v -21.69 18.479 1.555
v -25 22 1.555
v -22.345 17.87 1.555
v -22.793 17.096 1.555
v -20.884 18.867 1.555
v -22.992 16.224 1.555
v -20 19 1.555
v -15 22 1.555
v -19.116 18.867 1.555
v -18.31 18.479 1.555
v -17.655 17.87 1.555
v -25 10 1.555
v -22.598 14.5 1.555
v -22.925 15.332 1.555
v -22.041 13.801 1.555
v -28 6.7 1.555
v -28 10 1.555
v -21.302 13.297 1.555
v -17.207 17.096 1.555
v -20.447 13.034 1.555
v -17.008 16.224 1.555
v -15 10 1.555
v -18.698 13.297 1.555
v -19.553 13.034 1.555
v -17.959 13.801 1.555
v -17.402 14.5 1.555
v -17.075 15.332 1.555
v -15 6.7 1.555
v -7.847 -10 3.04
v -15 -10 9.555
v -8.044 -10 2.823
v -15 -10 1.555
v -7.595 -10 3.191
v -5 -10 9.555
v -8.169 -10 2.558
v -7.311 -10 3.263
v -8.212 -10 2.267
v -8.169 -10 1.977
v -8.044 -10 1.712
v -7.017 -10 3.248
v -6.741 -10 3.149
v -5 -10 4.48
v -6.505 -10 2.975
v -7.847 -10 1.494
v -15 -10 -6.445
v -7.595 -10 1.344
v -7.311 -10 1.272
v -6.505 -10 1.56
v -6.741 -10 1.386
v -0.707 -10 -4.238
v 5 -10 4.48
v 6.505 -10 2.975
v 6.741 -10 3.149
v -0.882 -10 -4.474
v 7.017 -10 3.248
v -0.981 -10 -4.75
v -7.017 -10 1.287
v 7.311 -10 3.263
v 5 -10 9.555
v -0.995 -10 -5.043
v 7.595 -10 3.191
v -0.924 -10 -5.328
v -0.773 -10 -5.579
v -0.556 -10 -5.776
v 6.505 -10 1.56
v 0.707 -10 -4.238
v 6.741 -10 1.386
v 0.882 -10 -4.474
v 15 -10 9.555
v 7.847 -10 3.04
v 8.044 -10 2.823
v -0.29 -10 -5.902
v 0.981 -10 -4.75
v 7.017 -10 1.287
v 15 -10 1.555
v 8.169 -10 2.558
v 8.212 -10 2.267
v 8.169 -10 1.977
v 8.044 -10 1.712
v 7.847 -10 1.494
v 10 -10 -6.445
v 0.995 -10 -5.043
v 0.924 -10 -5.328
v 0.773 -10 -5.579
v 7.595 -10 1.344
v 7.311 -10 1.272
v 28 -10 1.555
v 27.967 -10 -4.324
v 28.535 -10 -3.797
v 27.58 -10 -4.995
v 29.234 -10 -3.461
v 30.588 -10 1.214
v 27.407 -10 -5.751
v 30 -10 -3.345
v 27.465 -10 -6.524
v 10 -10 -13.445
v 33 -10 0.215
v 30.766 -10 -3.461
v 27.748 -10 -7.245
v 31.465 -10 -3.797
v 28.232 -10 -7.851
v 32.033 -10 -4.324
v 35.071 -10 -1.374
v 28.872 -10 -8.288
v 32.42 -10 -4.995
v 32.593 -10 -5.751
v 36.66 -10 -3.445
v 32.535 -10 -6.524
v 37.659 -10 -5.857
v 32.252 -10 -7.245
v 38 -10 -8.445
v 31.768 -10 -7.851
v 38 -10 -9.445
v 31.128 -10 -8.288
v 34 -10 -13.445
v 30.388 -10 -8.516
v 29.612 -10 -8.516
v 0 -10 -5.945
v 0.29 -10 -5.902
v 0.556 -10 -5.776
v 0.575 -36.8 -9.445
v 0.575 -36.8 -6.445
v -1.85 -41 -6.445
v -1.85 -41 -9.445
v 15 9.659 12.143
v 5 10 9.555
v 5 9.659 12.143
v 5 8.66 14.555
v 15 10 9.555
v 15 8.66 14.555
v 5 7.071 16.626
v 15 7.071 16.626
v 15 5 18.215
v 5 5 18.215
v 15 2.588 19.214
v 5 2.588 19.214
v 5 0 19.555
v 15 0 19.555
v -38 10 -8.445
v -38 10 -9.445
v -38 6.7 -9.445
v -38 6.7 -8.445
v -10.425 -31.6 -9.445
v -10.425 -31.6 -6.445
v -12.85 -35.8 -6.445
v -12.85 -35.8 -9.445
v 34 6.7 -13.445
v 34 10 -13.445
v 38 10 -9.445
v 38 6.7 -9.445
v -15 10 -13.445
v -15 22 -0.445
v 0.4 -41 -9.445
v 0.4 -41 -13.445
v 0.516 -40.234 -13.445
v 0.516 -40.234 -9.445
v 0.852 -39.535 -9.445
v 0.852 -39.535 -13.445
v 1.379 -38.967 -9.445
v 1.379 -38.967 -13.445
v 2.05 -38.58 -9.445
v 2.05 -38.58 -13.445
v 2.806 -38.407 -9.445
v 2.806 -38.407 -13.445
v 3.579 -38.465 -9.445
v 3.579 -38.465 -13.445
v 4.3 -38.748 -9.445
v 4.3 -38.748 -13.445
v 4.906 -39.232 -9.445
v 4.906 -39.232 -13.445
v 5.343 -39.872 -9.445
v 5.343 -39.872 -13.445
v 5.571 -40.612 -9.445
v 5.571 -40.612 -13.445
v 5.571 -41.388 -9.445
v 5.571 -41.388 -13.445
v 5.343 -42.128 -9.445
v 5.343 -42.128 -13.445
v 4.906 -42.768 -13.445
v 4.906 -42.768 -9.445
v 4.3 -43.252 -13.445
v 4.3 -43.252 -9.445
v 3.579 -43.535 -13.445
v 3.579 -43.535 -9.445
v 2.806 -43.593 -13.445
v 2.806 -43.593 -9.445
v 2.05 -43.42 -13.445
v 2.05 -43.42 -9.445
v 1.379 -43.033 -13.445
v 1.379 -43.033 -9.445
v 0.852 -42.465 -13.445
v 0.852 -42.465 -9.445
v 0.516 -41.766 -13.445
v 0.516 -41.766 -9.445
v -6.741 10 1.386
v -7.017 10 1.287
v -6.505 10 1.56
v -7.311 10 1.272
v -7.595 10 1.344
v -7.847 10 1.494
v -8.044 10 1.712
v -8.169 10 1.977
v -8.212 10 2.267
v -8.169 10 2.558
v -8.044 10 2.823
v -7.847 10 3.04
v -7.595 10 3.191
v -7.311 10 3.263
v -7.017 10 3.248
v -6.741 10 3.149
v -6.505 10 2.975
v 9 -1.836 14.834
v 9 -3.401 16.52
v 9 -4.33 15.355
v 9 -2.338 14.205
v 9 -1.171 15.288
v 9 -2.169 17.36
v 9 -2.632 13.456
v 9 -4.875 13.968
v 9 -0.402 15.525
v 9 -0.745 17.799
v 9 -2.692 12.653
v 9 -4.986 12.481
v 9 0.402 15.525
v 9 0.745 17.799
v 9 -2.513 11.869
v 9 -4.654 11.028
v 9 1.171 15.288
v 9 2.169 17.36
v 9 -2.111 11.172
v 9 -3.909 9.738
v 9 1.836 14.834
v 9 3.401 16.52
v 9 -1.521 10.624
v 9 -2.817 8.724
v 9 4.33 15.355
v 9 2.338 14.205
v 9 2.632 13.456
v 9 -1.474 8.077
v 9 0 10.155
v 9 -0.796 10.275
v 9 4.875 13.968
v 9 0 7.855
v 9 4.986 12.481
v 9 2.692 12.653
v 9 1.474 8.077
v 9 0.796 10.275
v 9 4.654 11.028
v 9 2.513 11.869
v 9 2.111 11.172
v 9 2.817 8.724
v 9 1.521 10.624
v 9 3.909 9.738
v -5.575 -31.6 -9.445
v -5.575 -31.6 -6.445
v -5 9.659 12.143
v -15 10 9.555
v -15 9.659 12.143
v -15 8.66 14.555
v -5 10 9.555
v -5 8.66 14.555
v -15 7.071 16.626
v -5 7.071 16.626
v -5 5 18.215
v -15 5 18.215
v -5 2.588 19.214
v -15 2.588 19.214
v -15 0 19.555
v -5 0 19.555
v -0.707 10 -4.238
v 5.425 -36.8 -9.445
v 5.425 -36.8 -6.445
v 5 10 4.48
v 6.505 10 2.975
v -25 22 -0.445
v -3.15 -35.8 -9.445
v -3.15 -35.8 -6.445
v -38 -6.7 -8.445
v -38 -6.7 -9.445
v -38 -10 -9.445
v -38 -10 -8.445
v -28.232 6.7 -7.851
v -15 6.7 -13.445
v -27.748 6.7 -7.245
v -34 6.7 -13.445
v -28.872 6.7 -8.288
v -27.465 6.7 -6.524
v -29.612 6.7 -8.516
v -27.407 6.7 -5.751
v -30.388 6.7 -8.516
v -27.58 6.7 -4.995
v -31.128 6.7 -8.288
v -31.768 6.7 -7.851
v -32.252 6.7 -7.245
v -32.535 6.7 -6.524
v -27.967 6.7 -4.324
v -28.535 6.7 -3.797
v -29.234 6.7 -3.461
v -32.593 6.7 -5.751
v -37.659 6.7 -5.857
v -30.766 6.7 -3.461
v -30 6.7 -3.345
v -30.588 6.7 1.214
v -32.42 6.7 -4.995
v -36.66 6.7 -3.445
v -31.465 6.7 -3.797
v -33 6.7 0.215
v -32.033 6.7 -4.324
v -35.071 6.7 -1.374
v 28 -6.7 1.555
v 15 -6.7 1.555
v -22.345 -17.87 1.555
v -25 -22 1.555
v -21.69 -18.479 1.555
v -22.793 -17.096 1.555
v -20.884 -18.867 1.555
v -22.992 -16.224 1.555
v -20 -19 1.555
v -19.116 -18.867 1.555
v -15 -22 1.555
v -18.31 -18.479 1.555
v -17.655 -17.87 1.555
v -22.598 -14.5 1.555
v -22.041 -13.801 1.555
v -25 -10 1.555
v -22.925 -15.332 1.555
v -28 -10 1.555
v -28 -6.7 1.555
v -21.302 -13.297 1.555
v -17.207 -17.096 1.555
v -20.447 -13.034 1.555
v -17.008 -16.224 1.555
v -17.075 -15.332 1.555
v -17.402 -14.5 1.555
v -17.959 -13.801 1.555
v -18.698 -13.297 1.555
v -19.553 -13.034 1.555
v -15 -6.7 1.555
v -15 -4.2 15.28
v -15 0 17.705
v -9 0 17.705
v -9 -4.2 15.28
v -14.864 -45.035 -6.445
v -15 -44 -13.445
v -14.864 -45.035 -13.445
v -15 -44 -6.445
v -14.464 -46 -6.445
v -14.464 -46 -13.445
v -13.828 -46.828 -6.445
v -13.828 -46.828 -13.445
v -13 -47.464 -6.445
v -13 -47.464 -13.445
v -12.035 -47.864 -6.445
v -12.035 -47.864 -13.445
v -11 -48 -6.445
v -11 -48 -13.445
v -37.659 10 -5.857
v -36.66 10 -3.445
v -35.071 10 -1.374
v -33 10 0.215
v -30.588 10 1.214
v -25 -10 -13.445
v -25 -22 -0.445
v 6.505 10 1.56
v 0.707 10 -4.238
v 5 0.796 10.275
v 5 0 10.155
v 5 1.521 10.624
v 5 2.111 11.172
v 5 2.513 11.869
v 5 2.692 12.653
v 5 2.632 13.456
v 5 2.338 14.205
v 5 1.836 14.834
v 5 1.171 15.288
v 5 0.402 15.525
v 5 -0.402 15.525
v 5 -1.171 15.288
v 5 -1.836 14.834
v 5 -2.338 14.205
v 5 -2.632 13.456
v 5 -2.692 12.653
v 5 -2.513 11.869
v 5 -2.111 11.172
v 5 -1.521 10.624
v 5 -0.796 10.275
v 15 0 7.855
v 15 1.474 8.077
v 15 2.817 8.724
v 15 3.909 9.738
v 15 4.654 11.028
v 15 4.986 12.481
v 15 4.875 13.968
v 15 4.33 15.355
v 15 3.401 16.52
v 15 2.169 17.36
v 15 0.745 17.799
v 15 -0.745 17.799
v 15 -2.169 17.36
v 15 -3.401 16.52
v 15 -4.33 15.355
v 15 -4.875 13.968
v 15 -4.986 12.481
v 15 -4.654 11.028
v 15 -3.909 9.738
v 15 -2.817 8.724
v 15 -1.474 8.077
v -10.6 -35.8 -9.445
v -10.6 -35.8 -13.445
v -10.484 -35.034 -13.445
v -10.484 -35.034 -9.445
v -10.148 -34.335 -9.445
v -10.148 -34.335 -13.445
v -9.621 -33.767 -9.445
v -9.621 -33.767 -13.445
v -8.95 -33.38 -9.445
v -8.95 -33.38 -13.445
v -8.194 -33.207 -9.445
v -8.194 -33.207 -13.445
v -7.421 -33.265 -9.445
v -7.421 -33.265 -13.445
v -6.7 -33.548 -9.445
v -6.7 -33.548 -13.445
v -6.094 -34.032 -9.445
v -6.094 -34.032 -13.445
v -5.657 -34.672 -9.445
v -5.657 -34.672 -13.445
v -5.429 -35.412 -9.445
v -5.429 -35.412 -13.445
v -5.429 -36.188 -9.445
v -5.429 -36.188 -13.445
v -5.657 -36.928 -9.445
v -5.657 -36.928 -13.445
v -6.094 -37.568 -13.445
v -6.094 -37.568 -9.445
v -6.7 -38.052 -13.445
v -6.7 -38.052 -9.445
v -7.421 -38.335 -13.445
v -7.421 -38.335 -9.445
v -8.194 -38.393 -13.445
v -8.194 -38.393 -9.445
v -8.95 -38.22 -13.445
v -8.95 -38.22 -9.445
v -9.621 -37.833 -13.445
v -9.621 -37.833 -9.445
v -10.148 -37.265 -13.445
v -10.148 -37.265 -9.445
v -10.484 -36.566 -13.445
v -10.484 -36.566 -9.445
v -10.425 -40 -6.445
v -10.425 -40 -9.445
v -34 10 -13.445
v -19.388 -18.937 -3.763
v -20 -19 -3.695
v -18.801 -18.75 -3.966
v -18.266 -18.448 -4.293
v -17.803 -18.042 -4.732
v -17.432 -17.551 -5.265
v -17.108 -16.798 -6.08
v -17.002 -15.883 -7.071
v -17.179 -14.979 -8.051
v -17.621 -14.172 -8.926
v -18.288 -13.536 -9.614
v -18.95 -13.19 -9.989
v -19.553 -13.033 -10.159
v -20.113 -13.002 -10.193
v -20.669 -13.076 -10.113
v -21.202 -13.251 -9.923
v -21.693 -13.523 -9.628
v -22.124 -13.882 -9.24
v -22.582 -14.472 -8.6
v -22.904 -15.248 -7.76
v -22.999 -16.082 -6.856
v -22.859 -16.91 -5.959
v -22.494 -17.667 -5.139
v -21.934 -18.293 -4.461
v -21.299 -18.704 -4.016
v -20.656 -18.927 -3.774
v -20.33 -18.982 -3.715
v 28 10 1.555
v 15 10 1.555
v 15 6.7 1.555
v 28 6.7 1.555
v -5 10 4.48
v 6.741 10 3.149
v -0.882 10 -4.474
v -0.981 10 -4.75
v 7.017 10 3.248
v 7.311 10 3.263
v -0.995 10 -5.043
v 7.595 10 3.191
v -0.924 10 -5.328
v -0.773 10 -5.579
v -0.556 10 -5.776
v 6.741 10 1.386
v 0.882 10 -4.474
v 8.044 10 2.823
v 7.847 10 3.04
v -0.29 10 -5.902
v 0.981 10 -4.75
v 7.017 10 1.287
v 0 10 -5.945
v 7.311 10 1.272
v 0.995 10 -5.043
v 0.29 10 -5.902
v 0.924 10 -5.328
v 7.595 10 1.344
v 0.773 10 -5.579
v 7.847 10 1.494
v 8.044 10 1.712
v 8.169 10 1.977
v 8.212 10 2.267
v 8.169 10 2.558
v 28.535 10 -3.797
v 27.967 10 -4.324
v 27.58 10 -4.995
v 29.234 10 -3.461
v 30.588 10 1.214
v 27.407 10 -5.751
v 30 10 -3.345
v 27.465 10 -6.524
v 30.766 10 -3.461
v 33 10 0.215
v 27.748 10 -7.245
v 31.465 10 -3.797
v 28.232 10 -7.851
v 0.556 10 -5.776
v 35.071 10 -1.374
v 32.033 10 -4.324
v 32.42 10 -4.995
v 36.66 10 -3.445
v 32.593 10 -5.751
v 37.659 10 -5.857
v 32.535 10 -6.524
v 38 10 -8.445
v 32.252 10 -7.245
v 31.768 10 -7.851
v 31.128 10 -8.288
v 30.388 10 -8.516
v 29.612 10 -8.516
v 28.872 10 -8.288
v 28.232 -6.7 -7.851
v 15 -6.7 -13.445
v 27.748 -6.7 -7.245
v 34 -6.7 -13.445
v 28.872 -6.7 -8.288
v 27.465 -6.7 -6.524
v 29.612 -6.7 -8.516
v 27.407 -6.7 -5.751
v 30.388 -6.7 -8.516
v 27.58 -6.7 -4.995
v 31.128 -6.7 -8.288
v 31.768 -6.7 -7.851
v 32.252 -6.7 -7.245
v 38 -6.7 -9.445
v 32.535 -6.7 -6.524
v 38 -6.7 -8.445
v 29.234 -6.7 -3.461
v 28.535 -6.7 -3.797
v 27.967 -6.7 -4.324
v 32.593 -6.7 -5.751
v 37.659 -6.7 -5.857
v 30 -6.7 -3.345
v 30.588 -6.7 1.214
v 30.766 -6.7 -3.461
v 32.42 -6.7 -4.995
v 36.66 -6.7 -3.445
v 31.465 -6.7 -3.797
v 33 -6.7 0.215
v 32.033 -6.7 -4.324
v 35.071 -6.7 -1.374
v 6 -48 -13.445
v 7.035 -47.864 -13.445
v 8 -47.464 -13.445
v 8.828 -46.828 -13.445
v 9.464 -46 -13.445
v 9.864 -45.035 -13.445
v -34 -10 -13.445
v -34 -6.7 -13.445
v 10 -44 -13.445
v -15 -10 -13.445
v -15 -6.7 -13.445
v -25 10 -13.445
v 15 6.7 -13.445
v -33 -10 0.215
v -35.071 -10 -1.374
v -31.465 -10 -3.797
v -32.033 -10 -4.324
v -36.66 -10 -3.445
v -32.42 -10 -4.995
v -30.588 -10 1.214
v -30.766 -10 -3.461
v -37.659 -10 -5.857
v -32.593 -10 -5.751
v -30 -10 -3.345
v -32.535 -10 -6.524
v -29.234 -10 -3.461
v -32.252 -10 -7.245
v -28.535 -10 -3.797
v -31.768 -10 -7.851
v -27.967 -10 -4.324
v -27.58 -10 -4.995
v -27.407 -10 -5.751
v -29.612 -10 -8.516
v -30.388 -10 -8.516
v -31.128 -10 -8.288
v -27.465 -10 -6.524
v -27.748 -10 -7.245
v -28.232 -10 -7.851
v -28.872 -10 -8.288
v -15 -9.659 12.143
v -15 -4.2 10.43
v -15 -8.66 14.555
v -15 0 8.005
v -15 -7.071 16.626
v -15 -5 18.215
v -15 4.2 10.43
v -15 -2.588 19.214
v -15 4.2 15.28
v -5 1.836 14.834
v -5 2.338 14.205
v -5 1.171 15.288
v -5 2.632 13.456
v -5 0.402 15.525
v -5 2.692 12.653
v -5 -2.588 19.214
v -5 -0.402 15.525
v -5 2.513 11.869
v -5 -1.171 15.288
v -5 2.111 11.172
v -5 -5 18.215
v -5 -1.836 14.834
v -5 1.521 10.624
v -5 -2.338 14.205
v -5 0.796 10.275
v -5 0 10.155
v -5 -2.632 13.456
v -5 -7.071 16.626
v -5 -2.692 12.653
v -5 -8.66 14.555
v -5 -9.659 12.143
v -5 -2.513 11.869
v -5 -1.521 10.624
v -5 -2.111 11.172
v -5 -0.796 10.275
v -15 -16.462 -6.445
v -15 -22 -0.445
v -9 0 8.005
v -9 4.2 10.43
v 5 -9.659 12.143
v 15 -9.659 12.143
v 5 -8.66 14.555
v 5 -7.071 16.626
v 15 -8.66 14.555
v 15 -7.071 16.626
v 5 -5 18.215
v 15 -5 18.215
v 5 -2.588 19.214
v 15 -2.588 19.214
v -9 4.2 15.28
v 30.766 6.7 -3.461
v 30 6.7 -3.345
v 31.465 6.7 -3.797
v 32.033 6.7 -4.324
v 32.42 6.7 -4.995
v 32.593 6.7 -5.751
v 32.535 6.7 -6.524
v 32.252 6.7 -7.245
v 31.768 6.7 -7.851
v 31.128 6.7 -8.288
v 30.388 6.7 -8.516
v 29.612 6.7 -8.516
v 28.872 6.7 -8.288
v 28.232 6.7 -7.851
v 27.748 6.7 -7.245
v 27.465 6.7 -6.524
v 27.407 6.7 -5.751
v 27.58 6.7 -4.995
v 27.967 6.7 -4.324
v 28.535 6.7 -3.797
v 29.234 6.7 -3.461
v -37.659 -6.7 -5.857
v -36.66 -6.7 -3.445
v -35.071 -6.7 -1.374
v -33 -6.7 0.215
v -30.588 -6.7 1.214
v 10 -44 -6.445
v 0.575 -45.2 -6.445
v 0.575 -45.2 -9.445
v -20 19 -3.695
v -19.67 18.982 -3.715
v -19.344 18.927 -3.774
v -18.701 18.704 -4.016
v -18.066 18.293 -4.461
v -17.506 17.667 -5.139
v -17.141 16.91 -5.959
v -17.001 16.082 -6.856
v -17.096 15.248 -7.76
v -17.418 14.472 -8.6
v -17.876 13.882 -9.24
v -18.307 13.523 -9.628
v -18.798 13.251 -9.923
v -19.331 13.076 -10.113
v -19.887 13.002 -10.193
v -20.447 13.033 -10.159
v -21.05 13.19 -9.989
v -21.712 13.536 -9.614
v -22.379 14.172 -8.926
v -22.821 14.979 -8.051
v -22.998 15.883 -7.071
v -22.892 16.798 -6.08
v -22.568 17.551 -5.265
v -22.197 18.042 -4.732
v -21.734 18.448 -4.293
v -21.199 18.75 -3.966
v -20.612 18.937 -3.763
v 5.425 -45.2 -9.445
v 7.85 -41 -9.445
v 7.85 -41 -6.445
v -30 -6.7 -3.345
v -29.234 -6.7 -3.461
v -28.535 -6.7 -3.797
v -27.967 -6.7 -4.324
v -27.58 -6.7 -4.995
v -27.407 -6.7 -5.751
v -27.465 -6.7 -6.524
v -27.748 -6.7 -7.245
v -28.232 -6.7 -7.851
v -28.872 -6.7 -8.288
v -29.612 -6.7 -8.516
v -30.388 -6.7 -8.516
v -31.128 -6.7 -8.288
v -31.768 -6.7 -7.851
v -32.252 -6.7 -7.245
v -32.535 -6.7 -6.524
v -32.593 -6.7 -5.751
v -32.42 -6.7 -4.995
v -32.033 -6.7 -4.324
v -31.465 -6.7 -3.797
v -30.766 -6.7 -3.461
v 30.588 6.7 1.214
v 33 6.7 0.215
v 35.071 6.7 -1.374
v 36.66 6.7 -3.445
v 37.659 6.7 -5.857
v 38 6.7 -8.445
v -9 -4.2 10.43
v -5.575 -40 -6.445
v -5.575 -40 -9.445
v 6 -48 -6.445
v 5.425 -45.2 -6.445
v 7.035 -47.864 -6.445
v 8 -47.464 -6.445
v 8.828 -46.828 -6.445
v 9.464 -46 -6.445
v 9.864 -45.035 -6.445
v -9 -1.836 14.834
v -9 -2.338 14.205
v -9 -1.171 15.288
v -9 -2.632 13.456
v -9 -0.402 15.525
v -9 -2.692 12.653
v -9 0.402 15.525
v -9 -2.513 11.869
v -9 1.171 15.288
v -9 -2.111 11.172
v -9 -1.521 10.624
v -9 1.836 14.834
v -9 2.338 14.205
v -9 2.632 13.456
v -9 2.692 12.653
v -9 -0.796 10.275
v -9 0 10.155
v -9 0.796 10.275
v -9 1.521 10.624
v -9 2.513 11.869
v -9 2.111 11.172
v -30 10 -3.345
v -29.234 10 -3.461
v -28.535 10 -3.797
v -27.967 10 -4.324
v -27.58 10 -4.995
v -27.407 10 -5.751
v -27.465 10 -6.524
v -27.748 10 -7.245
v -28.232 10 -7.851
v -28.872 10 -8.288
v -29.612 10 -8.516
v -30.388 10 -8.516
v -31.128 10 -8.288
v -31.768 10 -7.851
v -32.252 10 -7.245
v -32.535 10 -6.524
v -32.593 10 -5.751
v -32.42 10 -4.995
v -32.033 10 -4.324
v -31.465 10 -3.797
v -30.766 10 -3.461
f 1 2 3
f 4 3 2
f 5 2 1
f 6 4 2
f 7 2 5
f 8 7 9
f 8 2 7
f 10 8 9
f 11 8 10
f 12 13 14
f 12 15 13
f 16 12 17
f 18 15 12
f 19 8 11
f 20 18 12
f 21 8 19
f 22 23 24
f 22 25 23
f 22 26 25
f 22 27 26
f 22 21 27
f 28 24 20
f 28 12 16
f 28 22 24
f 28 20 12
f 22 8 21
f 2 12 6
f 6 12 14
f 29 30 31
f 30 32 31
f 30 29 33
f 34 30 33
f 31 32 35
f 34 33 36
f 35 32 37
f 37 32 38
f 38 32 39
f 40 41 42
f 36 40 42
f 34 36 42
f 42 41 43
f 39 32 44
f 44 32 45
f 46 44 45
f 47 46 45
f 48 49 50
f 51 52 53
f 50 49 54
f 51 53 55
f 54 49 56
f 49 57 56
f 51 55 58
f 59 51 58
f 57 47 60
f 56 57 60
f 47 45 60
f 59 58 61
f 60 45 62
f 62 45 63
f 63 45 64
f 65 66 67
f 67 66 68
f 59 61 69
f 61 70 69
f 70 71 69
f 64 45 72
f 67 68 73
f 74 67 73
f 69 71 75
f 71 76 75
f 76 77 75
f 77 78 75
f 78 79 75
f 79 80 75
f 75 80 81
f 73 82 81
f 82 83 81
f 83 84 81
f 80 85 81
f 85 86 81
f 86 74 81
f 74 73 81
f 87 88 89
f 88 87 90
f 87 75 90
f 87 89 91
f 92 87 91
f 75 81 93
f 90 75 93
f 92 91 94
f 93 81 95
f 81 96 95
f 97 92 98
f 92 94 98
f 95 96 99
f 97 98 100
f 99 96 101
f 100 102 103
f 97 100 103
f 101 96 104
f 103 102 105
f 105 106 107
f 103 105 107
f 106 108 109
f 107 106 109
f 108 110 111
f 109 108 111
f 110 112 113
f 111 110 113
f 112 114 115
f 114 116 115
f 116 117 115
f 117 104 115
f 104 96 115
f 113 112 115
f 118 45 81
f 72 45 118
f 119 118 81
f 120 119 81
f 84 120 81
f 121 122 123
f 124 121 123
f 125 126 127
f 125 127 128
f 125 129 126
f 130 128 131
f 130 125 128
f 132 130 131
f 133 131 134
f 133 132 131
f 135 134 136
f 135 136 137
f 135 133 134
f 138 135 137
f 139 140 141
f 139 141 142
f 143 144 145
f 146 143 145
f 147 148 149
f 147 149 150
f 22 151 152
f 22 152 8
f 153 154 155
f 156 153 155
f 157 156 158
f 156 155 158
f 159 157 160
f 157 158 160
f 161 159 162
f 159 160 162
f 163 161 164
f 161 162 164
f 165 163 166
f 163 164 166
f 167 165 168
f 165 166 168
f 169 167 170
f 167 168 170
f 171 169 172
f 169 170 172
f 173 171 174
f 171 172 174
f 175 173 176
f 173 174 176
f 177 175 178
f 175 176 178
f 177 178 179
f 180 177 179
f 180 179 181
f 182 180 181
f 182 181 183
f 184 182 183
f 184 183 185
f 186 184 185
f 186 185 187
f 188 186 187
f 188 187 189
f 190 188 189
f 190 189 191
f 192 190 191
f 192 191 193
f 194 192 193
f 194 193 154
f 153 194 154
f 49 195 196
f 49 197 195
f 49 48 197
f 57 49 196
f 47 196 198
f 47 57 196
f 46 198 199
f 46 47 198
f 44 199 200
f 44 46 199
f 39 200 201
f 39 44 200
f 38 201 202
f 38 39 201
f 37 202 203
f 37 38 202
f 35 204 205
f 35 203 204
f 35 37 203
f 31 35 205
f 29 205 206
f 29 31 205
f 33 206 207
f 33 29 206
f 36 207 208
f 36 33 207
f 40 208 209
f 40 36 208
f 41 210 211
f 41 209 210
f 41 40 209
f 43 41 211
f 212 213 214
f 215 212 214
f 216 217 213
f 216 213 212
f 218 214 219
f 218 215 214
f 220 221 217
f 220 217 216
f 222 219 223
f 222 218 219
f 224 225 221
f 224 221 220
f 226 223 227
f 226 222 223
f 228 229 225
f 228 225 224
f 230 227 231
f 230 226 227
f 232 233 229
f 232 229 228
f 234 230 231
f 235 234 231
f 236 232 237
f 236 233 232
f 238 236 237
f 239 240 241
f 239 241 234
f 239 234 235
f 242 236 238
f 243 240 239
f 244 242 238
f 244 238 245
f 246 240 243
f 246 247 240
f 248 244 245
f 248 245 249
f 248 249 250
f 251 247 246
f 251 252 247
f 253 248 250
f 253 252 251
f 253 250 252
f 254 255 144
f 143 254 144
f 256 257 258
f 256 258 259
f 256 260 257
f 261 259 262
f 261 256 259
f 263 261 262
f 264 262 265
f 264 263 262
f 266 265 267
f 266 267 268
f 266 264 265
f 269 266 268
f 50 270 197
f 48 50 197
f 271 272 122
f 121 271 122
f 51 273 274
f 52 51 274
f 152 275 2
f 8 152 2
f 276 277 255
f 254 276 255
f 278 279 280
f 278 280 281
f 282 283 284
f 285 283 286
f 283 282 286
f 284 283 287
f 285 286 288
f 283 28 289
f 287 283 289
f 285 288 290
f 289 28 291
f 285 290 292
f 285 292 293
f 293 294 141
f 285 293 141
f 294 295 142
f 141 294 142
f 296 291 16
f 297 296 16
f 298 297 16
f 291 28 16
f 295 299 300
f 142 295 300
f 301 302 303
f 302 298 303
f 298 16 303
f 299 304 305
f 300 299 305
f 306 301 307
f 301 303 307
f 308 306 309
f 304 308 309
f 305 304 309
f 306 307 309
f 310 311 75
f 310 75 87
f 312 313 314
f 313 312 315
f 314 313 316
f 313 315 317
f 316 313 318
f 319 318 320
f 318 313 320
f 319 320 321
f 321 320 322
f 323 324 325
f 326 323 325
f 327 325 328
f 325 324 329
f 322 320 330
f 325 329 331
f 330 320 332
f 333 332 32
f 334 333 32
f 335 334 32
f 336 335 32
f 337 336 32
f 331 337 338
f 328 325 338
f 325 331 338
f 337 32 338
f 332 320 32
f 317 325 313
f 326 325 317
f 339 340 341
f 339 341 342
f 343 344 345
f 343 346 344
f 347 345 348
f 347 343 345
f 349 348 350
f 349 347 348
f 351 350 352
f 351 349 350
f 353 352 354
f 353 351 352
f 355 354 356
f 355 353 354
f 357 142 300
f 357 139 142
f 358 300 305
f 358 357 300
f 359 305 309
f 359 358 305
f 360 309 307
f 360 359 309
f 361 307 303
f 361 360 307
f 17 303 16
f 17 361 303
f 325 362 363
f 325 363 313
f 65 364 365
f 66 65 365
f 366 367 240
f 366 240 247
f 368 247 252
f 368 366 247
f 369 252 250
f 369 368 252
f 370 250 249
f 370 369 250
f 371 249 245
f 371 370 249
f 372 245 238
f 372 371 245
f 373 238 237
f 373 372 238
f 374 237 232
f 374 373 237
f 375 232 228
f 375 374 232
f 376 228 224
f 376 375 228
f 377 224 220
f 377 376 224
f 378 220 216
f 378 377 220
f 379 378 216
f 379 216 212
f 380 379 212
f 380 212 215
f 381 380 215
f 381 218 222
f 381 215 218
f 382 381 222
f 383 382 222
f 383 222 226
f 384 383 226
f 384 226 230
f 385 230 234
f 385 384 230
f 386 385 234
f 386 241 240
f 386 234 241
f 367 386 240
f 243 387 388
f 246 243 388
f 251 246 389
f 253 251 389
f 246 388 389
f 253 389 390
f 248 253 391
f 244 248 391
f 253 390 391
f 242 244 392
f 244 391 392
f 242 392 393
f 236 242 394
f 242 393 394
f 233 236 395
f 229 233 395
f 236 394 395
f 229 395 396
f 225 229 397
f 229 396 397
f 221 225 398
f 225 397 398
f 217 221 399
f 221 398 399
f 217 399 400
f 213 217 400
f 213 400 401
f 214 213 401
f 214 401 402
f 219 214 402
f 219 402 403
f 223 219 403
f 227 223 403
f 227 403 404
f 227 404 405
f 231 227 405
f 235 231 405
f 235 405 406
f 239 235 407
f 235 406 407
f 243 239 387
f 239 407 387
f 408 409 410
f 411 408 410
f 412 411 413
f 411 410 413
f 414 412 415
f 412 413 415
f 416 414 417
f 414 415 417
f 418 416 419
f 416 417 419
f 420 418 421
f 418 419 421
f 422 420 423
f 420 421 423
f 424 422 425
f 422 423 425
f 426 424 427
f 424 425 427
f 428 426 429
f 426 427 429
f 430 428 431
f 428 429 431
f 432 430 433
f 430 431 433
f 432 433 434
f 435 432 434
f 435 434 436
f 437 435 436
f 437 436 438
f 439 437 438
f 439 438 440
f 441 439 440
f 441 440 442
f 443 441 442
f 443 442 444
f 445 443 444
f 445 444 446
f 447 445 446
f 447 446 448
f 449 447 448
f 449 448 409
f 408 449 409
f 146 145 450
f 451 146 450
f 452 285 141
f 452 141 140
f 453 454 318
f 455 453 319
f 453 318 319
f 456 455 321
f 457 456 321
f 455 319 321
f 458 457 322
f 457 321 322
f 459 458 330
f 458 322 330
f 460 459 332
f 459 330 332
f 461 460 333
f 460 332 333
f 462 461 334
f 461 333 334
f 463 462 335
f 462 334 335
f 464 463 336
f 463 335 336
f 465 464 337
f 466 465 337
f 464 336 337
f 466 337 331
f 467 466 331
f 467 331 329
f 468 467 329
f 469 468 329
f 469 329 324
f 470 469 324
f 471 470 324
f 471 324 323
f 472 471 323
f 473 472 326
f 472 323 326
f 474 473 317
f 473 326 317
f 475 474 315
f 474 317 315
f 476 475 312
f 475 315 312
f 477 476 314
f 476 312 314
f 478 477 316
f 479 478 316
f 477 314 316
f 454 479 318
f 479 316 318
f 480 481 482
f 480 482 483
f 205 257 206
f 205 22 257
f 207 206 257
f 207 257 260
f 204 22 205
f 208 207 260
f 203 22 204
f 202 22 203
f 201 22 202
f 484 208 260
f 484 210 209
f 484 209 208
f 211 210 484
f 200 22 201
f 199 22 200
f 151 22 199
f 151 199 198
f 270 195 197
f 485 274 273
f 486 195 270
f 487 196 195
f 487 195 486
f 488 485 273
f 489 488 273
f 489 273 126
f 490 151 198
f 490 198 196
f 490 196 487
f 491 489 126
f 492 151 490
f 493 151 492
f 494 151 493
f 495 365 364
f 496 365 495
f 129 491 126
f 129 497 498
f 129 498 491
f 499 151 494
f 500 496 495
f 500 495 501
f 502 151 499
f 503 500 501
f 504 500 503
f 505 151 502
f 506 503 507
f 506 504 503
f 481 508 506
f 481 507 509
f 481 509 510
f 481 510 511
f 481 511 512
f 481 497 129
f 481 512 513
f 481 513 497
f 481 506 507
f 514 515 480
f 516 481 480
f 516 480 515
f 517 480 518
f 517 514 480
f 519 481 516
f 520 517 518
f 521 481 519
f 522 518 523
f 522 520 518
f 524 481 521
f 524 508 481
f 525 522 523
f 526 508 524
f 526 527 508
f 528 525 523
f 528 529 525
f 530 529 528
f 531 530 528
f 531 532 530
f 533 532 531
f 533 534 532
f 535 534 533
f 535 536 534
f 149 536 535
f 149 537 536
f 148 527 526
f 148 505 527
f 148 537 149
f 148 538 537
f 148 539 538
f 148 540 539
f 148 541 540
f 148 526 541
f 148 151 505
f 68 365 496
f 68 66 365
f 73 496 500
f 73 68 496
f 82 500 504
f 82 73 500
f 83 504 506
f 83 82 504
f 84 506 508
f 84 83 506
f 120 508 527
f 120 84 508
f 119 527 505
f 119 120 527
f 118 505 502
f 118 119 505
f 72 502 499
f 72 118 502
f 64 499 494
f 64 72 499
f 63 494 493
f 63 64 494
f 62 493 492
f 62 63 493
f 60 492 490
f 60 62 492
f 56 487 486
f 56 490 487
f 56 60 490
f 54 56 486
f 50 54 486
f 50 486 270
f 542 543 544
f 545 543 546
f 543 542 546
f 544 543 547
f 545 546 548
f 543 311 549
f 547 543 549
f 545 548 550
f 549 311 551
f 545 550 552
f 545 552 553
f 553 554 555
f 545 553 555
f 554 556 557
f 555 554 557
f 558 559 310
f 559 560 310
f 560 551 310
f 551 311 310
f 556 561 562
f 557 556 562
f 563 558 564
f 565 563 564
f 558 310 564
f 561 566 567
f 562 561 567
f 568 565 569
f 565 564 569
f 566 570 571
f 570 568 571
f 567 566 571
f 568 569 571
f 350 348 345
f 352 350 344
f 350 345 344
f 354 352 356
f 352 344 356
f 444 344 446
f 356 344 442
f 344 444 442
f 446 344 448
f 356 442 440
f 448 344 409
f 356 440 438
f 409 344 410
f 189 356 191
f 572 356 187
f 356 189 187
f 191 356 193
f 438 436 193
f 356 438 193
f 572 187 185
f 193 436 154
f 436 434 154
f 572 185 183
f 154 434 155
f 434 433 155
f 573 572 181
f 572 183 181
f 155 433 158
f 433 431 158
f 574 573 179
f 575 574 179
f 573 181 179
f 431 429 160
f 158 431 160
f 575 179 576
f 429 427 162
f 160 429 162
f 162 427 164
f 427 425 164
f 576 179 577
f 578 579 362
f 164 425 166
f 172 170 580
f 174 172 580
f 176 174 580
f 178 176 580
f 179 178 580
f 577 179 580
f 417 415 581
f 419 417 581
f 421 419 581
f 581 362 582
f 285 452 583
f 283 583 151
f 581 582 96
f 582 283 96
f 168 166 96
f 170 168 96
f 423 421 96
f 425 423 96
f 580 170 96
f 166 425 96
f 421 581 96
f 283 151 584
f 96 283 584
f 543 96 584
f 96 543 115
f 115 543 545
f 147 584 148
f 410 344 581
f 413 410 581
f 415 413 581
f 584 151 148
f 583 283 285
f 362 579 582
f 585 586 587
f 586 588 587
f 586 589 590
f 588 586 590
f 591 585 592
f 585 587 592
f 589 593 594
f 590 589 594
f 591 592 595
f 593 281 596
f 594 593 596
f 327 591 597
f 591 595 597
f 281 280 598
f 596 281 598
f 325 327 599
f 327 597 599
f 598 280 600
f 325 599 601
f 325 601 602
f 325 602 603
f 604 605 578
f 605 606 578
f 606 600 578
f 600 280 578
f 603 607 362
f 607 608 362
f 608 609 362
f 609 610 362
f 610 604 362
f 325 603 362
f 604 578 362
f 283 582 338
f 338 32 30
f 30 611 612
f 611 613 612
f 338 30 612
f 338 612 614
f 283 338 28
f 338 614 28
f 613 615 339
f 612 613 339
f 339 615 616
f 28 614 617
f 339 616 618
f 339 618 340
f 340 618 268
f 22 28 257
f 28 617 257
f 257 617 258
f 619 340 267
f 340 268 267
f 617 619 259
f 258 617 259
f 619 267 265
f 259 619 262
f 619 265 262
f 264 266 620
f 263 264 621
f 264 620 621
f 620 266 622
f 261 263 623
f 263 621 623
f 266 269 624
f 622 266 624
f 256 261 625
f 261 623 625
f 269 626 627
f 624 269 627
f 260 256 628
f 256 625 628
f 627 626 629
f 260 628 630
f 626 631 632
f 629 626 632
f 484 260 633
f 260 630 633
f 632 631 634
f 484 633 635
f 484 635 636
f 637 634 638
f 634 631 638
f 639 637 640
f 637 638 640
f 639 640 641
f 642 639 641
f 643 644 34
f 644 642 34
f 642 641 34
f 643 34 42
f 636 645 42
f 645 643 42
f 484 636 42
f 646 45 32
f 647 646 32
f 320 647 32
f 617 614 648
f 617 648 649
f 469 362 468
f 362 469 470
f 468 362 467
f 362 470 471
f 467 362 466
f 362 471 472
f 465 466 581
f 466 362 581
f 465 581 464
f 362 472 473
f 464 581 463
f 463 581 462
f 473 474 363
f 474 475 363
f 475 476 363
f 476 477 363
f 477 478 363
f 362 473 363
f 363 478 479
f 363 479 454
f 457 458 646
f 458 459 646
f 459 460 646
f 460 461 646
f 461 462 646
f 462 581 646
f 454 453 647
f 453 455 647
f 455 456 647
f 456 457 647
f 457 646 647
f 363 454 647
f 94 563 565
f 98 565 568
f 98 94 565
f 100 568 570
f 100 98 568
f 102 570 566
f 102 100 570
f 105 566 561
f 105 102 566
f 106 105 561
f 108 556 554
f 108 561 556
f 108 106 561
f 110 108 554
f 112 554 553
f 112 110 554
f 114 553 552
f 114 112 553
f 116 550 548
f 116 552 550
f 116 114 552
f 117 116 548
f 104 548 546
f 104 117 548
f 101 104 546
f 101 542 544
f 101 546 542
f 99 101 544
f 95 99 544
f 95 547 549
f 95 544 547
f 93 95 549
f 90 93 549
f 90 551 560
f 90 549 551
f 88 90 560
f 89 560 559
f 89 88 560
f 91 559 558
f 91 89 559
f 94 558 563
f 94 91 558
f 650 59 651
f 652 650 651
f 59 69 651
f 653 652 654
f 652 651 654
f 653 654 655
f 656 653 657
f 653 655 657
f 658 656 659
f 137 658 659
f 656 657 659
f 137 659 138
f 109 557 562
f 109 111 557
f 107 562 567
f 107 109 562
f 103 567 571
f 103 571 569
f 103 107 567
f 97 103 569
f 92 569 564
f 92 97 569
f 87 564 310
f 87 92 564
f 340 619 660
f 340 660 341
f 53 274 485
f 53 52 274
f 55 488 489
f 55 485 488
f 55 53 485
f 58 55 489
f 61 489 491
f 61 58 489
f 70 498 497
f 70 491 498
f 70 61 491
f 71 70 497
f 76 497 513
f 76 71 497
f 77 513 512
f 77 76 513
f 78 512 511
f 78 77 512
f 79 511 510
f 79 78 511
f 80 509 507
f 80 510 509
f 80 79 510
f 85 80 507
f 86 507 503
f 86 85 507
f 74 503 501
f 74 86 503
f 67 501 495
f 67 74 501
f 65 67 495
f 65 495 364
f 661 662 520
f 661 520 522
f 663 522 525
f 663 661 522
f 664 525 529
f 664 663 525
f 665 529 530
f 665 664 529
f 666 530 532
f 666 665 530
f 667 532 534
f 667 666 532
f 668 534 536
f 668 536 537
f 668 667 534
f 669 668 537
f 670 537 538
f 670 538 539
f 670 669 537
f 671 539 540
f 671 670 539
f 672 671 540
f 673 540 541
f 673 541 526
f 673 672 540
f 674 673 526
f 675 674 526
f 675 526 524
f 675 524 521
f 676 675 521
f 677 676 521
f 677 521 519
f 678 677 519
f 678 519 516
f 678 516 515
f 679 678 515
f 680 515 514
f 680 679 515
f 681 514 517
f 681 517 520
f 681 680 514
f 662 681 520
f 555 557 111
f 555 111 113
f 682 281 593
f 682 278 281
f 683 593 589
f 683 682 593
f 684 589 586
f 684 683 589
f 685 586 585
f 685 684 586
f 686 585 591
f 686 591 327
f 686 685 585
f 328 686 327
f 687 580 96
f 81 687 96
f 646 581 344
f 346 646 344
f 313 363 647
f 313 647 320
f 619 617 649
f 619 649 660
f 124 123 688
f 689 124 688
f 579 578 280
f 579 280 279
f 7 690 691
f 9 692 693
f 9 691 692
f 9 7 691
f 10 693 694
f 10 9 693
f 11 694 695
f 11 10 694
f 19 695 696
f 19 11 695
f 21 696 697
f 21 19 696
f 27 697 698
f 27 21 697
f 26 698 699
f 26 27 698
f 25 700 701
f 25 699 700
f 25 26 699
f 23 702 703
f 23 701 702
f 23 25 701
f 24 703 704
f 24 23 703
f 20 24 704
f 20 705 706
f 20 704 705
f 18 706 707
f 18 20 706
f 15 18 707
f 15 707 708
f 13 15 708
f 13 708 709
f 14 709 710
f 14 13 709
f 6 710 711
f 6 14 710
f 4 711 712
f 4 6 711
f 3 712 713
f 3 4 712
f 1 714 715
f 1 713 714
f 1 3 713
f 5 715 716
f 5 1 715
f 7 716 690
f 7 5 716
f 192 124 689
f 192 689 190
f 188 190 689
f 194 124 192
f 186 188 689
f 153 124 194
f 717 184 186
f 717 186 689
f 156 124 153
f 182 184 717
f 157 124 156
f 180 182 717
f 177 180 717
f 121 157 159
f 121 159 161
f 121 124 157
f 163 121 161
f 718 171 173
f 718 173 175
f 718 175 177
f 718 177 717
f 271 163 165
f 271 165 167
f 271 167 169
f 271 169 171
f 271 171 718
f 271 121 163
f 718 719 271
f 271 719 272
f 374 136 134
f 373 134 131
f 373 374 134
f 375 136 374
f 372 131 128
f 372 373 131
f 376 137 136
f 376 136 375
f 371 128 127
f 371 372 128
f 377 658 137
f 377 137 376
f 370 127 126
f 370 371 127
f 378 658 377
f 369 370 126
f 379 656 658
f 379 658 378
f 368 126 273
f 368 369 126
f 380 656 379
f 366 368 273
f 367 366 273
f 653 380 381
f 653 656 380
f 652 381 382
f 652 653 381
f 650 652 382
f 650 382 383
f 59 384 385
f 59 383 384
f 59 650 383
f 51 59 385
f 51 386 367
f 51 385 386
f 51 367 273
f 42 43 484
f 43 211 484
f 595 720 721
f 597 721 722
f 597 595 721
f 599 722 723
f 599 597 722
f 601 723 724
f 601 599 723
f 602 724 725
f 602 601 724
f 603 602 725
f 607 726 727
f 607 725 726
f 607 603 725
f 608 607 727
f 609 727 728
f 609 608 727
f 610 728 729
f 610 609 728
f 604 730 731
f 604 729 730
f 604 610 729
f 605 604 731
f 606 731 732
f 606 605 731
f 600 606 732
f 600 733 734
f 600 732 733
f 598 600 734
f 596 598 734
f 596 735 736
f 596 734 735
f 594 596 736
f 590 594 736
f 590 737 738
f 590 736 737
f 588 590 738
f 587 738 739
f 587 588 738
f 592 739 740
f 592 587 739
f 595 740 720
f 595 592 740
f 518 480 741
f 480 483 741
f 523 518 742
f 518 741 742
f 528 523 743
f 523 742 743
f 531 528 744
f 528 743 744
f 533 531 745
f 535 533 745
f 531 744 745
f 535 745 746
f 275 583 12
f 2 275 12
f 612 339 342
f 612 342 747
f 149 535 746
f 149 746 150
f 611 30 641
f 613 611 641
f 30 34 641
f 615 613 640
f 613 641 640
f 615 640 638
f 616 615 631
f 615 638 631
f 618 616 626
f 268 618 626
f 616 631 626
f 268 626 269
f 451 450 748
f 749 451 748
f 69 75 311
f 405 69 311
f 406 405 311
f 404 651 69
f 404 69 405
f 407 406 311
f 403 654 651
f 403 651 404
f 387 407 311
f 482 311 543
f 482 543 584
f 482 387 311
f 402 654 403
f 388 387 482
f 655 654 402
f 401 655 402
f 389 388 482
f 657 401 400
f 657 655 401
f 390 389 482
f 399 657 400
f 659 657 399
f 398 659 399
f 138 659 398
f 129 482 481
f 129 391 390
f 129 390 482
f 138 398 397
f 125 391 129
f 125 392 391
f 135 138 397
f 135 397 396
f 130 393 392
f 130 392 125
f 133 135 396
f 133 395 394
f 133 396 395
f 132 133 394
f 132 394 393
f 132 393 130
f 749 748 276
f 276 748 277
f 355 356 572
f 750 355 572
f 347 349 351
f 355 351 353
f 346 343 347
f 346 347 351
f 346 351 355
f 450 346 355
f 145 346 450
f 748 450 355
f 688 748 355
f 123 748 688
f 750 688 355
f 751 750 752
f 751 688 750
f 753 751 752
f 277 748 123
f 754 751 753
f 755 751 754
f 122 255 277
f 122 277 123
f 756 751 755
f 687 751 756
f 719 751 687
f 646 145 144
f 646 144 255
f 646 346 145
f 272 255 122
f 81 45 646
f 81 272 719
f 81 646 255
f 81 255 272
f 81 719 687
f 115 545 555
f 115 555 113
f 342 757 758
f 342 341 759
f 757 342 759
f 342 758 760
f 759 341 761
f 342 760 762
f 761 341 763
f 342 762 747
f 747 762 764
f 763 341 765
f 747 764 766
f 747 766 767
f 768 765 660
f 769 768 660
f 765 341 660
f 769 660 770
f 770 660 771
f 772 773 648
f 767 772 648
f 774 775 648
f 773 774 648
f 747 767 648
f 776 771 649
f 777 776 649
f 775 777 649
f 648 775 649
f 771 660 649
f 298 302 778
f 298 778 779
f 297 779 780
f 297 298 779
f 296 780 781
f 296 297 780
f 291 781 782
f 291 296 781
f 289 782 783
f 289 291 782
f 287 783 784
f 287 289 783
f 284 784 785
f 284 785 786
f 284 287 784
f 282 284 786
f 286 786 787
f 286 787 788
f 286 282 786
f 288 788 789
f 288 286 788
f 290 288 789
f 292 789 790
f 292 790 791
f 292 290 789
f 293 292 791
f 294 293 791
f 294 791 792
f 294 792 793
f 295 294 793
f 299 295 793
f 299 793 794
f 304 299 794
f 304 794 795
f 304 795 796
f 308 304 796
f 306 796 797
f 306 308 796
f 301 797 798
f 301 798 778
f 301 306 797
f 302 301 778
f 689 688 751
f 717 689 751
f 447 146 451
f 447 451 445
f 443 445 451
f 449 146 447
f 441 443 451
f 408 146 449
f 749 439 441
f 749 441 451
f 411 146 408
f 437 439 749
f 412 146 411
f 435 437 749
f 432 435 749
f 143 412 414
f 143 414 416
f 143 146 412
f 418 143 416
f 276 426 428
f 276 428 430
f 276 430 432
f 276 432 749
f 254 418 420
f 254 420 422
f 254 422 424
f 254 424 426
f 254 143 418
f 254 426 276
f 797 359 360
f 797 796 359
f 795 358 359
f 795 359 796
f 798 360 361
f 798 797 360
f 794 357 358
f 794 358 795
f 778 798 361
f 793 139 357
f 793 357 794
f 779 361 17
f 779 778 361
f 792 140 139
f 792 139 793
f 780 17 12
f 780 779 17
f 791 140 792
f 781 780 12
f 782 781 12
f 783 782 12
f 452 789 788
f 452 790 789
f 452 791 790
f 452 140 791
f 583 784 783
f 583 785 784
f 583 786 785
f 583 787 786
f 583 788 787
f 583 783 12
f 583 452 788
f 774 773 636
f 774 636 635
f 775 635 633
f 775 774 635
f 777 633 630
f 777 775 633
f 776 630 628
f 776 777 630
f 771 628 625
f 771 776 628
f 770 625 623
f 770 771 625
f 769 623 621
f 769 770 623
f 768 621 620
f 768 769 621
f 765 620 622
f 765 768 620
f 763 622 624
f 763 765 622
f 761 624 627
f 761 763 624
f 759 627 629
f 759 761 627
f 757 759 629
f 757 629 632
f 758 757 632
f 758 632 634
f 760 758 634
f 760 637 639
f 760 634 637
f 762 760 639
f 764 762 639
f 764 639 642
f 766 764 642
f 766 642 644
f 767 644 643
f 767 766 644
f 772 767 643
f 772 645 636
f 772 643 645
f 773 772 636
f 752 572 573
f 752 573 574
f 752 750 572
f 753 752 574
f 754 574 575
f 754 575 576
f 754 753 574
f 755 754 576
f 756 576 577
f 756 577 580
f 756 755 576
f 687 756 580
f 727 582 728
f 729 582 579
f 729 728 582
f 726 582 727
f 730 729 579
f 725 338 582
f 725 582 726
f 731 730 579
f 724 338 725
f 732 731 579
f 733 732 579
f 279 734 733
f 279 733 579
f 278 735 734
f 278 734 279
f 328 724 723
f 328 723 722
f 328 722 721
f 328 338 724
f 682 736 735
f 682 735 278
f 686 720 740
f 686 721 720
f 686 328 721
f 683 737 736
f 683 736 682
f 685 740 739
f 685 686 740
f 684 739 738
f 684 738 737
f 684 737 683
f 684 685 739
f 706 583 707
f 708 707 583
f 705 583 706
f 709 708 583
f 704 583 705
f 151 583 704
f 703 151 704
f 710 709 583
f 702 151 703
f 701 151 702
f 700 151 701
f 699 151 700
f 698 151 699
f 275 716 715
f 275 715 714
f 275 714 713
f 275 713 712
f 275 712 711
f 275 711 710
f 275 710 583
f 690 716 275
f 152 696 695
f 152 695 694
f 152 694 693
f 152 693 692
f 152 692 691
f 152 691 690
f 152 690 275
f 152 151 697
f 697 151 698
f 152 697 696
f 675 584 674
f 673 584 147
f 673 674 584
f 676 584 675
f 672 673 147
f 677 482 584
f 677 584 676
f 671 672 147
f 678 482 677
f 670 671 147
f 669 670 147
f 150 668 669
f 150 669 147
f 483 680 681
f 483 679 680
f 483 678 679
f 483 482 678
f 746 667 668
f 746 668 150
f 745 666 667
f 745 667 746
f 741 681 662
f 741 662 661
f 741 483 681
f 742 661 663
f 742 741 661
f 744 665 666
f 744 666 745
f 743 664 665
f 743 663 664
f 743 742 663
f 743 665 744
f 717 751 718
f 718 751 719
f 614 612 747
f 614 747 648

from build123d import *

# Parameters (mm, degrees)
SKIZZE2_R                            = 2.6
AUFSATZ_LINEAR_AUSTRAGEN1_DEPTH      = 10
SCHNITT_LINEAR_AUSTRAGEN1_DEPTH      = 44.890751019
SCHNITT_LINEAR_AUSTRAGEN1_DEPTH_BACK = 44.890751019
SKIZZE3_R                            = 1
SKIZZE3_W                            = 10
SKIZZE3_H                            = 22.630927951
SKIZZE4_W                            = 30
SKIZZE4_H                            = 13.4
SCHNITT_LINEAR_AUSTRAGEN2_DEPTH      = 44.890751019
SCHNITT_LINEAR_AUSTRAGEN3_DEPTH      = 44.890751019
SCHNITT_LINEAR_AUSTRAGEN3_DEPTH_BACK = 44.890751019
SKIZZE5_R                            = 2.7
SCHNITT_LINEAR_START                 = 15
SKIZZE6_R                            = 5
SCHNITT_LINEAR_AUSTRAGEN4_DEPTH      = 6
SCHNITT_LINEAR_START_2               = -15
SCHNITT_LINEAR_AUSTRAGEN5_DEPTH      = 6
AUFSATZ_LINEAR_START                 = -15
AUFSATZ_LINEAR_AUSTRAGEN2_DEPTH      = 10
SKIZZE10_R                           = 3
SCHNITT_LINEAR_AUSTRAGEN6_DEPTH      = 49.06659989
FASE1_SIZE                           = 4
VERRUNDUNG1_R                        = 10
VERRUNDUNG2_R                        = 10
SKIZZE11_R                           = 2.6
AUFSATZ_LINEAR_AUSTRAGEN3_DEPTH      = 7
VERRUNDUNG3_R                        = 4
SCHNITT_LINEAR_AUSTRAGEN7_DEPTH      = 3


with BuildPart() as part:
    # Skizze2 → Aufsatz-Linear austragen1 (new, symmetric)
    with BuildSketch(Plane(origin=(0, 0, 0), x_dir=(1, 0, 0), z_dir=(0, 1, 0))):
        Polygon((38, 13.445), (-38, 13.445), (-38, -1.555), (-15, -1.555), (-15, -19.555), (15, -19.555), (15, -1.555), (38, -1.555), align=None)
        with Locations(Location((-30, 5.945, 0), (0, 0, 270))):
            Circle(SKIZZE2_R, mode=Mode.SUBTRACT)
        with Locations(Location((30, 5.945, 0), (0, 0, 270))):
            Circle(SKIZZE2_R, mode=Mode.SUBTRACT)
        Polygon((0, -9.479978336), (7.212489168, -2.267489168), (0, 4.945), (-7.212489168, -2.267489168), align=None, mode=Mode.SUBTRACT)
    extrude(amount=AUFSATZ_LINEAR_AUSTRAGEN1_DEPTH, both=True)

    # Skizze3 → Schnitt-Linear austragen1 (cut, two sides: drawn at the far end of the back side and taken through both)
    with BuildSketch(Plane(origin=(0, 0, 0), x_dir=(1, 0, 0), z_dir=(0, 1, 0)).offset(-SCHNITT_LINEAR_AUSTRAGEN1_DEPTH_BACK)):
        with Locations((0, 4.945)):
            Circle(SKIZZE3_R)
        with Locations((-7.212489168, -2.267489168)):
            Circle(SKIZZE3_R)
        with Locations((7.212489168, -2.267489168)):
            Circle(SKIZZE3_R)
        with Locations((0, -15.795442312)):
            Rectangle(SKIZZE3_W, SKIZZE3_H)
    extrude(amount=SCHNITT_LINEAR_AUSTRAGEN1_DEPTH + SCHNITT_LINEAR_AUSTRAGEN1_DEPTH_BACK, mode=Mode.SUBTRACT)

    # Skizze4 → Schnitt-Linear austragen2 (cut, symmetric)
    with BuildSketch(Plane.XY):
        with Locations((30, 0)):
            Rectangle(SKIZZE4_W, SKIZZE4_H)
    schnitt_linear_austragen2 = extrude(amount=SCHNITT_LINEAR_AUSTRAGEN2_DEPTH, both=True, mode=Mode.SUBTRACT)

    # Spiegeln1: Schnitt-Linear austragen2 across plane
    add(schnitt_linear_austragen2.mirror(Plane(origin=(0, 0, 0), x_dir=(0, 0, 1), z_dir=(1, 0, 0))), mode=Mode.SUBTRACT)

    # Skizze5 → Schnitt-Linear austragen3 (cut, two sides: drawn at the far end of the back side and taken through both)
    with BuildSketch(Plane(origin=(0, 0, 0), x_dir=(0, 0, -1), z_dir=(1, 0, 0)).offset(-SCHNITT_LINEAR_AUSTRAGEN3_DEPTH_BACK)):
        with Locations((-12.855, 0)):
            Circle(SKIZZE5_R)
    extrude(amount=SCHNITT_LINEAR_AUSTRAGEN3_DEPTH + SCHNITT_LINEAR_AUSTRAGEN3_DEPTH_BACK, mode=Mode.SUBTRACT)

    # Skizze6 → Schnitt-Linear austragen4 (cut)
    with BuildSketch(Plane(origin=(0, 0, 0), x_dir=(0, 0, -1), z_dir=(1, 0, 0)).offset(SCHNITT_LINEAR_START)):
        with Locations((-12.855, 0)):
            Circle(SKIZZE6_R)
    extrude(amount=-SCHNITT_LINEAR_AUSTRAGEN4_DEPTH, mode=Mode.SUBTRACT)

    # Skizze7 → Schnitt-Linear austragen5 (cut)
    with BuildSketch(Plane(origin=(0, 0, 0), x_dir=(0, 0, -1), z_dir=(1, 0, 0)).offset(SCHNITT_LINEAR_START_2)):
        Polygon((-15.279871131, 4.2), (-17.704742261, 0), (-15.279871131, -4.2), (-10.430128869, -4.2), (-8.005257739, 0), (-10.430128869, 4.2), align=None)
    extrude(amount=SCHNITT_LINEAR_AUSTRAGEN5_DEPTH, mode=Mode.SUBTRACT)

    # Skizze9 → Aufsatz-Linear austragen2 (add)
    with BuildSketch(Plane(origin=(0, 0, 0), x_dir=(0, 0, -1), z_dir=(1, 0, 0)).offset(AUFSATZ_LINEAR_START)):
        Polygon((-1.555, -10), (13.445, -10), (0.445, -22), (-1.555, -22), align=None)
    aufsatz_linear_austragen2 = extrude(amount=-AUFSATZ_LINEAR_AUSTRAGEN2_DEPTH)

    # Spiegeln2: Aufsatz-Linear austragen2 across plane
    add(aufsatz_linear_austragen2.mirror(Plane.ZX))

    # Skizze10 → Schnitt-Linear austragen6 (cut, symmetric)
    with BuildSketch(Plane.XY):
        with Locations(Location((-20, -16, 0), (0, 0, 270))):
            Circle(SKIZZE10_R)
    schnitt_linear_austragen6 = extrude(amount=SCHNITT_LINEAR_AUSTRAGEN6_DEPTH, both=True, mode=Mode.SUBTRACT)

    # Spiegeln3: Schnitt-Linear austragen6 across plane
    add(schnitt_linear_austragen6.mirror(Plane.ZX), mode=Mode.SUBTRACT)

    # Fase1
    fase1_edges = [part.edges().sort_by_distance(p)[0] for p in [
        (-38, 8.35, -13.445),
        (-38, -8.35, -13.445),
        (38, 8.35, -13.445),
        (38, -8.35, -13.445),
    ]]
    chamfer(fase1_edges, length=FASE1_SIZE)

    # Verrundung1
    verrundung1_edges = [part.edges().sort_by_distance(p)[0] for p in [
        (38, 8.35, 1.555),
        (38, -8.35, 1.555),
        (-38, -8.35, 1.555),
        (-38, 8.35, 1.555),
    ]]
    fillet(verrundung1_edges, radius=VERRUNDUNG1_R)

    # Verrundung2
    verrundung2_edges = [part.edges().sort_by_distance(p)[0] for p in [
        (10, -10, 19.555),
        (-10, -10, 19.555),
        (-10, 10, 19.555),
        (10, 10, 19.555),
    ]]
    fillet(verrundung2_edges, radius=VERRUNDUNG2_R - 0.0001)  # a hair under: the kernel refuses the full size

    # Skizze11 → Aufsatz-Linear austragen3 (add)
    with BuildSketch(Plane(origin=(0, 0, -13.445), x_dir=(-1, 0, 0), z_dir=(0, 0, -1))):
        Polygon((10, -10), (15, -10), (15, -48), (-10, -48), (-10, -10), align=None)
        with Locations((-3, -41)):
            Circle(SKIZZE11_R, mode=Mode.SUBTRACT)
        with Locations((8, -35.8)):
            Circle(SKIZZE11_R, mode=Mode.SUBTRACT)
    extrude(amount=-AUFSATZ_LINEAR_AUSTRAGEN3_DEPTH)

    # Verrundung3
    verrundung3_edges = [part.edges().sort_by_distance(p)[0] for p in [
        (10, -48, -9.945),
        (-15, -48, -9.945),
    ]]
    fillet(verrundung3_edges, radius=VERRUNDUNG3_R)

    # Skizze12 → Schnitt-Linear austragen7 (cut)
    with BuildSketch(Plane.XY.offset(-6.445)):
        Polygon((5.424871131, -36.8), (0.575128869, -36.8), (-1.849742261, -41), (0.575128869, -45.2), (5.424871131, -45.2), (7.849742261, -41), align=None)
        Polygon((-10.424871131, -40), (-5.575128869, -40), (-3.150257739, -35.8), (-5.575128869, -31.6), (-10.424871131, -31.6), (-12.849742261, -35.8), align=None)
    extrude(amount=-SCHNITT_LINEAR_AUSTRAGEN7_DEPTH, mode=Mode.SUBTRACT)


solid = part.part
